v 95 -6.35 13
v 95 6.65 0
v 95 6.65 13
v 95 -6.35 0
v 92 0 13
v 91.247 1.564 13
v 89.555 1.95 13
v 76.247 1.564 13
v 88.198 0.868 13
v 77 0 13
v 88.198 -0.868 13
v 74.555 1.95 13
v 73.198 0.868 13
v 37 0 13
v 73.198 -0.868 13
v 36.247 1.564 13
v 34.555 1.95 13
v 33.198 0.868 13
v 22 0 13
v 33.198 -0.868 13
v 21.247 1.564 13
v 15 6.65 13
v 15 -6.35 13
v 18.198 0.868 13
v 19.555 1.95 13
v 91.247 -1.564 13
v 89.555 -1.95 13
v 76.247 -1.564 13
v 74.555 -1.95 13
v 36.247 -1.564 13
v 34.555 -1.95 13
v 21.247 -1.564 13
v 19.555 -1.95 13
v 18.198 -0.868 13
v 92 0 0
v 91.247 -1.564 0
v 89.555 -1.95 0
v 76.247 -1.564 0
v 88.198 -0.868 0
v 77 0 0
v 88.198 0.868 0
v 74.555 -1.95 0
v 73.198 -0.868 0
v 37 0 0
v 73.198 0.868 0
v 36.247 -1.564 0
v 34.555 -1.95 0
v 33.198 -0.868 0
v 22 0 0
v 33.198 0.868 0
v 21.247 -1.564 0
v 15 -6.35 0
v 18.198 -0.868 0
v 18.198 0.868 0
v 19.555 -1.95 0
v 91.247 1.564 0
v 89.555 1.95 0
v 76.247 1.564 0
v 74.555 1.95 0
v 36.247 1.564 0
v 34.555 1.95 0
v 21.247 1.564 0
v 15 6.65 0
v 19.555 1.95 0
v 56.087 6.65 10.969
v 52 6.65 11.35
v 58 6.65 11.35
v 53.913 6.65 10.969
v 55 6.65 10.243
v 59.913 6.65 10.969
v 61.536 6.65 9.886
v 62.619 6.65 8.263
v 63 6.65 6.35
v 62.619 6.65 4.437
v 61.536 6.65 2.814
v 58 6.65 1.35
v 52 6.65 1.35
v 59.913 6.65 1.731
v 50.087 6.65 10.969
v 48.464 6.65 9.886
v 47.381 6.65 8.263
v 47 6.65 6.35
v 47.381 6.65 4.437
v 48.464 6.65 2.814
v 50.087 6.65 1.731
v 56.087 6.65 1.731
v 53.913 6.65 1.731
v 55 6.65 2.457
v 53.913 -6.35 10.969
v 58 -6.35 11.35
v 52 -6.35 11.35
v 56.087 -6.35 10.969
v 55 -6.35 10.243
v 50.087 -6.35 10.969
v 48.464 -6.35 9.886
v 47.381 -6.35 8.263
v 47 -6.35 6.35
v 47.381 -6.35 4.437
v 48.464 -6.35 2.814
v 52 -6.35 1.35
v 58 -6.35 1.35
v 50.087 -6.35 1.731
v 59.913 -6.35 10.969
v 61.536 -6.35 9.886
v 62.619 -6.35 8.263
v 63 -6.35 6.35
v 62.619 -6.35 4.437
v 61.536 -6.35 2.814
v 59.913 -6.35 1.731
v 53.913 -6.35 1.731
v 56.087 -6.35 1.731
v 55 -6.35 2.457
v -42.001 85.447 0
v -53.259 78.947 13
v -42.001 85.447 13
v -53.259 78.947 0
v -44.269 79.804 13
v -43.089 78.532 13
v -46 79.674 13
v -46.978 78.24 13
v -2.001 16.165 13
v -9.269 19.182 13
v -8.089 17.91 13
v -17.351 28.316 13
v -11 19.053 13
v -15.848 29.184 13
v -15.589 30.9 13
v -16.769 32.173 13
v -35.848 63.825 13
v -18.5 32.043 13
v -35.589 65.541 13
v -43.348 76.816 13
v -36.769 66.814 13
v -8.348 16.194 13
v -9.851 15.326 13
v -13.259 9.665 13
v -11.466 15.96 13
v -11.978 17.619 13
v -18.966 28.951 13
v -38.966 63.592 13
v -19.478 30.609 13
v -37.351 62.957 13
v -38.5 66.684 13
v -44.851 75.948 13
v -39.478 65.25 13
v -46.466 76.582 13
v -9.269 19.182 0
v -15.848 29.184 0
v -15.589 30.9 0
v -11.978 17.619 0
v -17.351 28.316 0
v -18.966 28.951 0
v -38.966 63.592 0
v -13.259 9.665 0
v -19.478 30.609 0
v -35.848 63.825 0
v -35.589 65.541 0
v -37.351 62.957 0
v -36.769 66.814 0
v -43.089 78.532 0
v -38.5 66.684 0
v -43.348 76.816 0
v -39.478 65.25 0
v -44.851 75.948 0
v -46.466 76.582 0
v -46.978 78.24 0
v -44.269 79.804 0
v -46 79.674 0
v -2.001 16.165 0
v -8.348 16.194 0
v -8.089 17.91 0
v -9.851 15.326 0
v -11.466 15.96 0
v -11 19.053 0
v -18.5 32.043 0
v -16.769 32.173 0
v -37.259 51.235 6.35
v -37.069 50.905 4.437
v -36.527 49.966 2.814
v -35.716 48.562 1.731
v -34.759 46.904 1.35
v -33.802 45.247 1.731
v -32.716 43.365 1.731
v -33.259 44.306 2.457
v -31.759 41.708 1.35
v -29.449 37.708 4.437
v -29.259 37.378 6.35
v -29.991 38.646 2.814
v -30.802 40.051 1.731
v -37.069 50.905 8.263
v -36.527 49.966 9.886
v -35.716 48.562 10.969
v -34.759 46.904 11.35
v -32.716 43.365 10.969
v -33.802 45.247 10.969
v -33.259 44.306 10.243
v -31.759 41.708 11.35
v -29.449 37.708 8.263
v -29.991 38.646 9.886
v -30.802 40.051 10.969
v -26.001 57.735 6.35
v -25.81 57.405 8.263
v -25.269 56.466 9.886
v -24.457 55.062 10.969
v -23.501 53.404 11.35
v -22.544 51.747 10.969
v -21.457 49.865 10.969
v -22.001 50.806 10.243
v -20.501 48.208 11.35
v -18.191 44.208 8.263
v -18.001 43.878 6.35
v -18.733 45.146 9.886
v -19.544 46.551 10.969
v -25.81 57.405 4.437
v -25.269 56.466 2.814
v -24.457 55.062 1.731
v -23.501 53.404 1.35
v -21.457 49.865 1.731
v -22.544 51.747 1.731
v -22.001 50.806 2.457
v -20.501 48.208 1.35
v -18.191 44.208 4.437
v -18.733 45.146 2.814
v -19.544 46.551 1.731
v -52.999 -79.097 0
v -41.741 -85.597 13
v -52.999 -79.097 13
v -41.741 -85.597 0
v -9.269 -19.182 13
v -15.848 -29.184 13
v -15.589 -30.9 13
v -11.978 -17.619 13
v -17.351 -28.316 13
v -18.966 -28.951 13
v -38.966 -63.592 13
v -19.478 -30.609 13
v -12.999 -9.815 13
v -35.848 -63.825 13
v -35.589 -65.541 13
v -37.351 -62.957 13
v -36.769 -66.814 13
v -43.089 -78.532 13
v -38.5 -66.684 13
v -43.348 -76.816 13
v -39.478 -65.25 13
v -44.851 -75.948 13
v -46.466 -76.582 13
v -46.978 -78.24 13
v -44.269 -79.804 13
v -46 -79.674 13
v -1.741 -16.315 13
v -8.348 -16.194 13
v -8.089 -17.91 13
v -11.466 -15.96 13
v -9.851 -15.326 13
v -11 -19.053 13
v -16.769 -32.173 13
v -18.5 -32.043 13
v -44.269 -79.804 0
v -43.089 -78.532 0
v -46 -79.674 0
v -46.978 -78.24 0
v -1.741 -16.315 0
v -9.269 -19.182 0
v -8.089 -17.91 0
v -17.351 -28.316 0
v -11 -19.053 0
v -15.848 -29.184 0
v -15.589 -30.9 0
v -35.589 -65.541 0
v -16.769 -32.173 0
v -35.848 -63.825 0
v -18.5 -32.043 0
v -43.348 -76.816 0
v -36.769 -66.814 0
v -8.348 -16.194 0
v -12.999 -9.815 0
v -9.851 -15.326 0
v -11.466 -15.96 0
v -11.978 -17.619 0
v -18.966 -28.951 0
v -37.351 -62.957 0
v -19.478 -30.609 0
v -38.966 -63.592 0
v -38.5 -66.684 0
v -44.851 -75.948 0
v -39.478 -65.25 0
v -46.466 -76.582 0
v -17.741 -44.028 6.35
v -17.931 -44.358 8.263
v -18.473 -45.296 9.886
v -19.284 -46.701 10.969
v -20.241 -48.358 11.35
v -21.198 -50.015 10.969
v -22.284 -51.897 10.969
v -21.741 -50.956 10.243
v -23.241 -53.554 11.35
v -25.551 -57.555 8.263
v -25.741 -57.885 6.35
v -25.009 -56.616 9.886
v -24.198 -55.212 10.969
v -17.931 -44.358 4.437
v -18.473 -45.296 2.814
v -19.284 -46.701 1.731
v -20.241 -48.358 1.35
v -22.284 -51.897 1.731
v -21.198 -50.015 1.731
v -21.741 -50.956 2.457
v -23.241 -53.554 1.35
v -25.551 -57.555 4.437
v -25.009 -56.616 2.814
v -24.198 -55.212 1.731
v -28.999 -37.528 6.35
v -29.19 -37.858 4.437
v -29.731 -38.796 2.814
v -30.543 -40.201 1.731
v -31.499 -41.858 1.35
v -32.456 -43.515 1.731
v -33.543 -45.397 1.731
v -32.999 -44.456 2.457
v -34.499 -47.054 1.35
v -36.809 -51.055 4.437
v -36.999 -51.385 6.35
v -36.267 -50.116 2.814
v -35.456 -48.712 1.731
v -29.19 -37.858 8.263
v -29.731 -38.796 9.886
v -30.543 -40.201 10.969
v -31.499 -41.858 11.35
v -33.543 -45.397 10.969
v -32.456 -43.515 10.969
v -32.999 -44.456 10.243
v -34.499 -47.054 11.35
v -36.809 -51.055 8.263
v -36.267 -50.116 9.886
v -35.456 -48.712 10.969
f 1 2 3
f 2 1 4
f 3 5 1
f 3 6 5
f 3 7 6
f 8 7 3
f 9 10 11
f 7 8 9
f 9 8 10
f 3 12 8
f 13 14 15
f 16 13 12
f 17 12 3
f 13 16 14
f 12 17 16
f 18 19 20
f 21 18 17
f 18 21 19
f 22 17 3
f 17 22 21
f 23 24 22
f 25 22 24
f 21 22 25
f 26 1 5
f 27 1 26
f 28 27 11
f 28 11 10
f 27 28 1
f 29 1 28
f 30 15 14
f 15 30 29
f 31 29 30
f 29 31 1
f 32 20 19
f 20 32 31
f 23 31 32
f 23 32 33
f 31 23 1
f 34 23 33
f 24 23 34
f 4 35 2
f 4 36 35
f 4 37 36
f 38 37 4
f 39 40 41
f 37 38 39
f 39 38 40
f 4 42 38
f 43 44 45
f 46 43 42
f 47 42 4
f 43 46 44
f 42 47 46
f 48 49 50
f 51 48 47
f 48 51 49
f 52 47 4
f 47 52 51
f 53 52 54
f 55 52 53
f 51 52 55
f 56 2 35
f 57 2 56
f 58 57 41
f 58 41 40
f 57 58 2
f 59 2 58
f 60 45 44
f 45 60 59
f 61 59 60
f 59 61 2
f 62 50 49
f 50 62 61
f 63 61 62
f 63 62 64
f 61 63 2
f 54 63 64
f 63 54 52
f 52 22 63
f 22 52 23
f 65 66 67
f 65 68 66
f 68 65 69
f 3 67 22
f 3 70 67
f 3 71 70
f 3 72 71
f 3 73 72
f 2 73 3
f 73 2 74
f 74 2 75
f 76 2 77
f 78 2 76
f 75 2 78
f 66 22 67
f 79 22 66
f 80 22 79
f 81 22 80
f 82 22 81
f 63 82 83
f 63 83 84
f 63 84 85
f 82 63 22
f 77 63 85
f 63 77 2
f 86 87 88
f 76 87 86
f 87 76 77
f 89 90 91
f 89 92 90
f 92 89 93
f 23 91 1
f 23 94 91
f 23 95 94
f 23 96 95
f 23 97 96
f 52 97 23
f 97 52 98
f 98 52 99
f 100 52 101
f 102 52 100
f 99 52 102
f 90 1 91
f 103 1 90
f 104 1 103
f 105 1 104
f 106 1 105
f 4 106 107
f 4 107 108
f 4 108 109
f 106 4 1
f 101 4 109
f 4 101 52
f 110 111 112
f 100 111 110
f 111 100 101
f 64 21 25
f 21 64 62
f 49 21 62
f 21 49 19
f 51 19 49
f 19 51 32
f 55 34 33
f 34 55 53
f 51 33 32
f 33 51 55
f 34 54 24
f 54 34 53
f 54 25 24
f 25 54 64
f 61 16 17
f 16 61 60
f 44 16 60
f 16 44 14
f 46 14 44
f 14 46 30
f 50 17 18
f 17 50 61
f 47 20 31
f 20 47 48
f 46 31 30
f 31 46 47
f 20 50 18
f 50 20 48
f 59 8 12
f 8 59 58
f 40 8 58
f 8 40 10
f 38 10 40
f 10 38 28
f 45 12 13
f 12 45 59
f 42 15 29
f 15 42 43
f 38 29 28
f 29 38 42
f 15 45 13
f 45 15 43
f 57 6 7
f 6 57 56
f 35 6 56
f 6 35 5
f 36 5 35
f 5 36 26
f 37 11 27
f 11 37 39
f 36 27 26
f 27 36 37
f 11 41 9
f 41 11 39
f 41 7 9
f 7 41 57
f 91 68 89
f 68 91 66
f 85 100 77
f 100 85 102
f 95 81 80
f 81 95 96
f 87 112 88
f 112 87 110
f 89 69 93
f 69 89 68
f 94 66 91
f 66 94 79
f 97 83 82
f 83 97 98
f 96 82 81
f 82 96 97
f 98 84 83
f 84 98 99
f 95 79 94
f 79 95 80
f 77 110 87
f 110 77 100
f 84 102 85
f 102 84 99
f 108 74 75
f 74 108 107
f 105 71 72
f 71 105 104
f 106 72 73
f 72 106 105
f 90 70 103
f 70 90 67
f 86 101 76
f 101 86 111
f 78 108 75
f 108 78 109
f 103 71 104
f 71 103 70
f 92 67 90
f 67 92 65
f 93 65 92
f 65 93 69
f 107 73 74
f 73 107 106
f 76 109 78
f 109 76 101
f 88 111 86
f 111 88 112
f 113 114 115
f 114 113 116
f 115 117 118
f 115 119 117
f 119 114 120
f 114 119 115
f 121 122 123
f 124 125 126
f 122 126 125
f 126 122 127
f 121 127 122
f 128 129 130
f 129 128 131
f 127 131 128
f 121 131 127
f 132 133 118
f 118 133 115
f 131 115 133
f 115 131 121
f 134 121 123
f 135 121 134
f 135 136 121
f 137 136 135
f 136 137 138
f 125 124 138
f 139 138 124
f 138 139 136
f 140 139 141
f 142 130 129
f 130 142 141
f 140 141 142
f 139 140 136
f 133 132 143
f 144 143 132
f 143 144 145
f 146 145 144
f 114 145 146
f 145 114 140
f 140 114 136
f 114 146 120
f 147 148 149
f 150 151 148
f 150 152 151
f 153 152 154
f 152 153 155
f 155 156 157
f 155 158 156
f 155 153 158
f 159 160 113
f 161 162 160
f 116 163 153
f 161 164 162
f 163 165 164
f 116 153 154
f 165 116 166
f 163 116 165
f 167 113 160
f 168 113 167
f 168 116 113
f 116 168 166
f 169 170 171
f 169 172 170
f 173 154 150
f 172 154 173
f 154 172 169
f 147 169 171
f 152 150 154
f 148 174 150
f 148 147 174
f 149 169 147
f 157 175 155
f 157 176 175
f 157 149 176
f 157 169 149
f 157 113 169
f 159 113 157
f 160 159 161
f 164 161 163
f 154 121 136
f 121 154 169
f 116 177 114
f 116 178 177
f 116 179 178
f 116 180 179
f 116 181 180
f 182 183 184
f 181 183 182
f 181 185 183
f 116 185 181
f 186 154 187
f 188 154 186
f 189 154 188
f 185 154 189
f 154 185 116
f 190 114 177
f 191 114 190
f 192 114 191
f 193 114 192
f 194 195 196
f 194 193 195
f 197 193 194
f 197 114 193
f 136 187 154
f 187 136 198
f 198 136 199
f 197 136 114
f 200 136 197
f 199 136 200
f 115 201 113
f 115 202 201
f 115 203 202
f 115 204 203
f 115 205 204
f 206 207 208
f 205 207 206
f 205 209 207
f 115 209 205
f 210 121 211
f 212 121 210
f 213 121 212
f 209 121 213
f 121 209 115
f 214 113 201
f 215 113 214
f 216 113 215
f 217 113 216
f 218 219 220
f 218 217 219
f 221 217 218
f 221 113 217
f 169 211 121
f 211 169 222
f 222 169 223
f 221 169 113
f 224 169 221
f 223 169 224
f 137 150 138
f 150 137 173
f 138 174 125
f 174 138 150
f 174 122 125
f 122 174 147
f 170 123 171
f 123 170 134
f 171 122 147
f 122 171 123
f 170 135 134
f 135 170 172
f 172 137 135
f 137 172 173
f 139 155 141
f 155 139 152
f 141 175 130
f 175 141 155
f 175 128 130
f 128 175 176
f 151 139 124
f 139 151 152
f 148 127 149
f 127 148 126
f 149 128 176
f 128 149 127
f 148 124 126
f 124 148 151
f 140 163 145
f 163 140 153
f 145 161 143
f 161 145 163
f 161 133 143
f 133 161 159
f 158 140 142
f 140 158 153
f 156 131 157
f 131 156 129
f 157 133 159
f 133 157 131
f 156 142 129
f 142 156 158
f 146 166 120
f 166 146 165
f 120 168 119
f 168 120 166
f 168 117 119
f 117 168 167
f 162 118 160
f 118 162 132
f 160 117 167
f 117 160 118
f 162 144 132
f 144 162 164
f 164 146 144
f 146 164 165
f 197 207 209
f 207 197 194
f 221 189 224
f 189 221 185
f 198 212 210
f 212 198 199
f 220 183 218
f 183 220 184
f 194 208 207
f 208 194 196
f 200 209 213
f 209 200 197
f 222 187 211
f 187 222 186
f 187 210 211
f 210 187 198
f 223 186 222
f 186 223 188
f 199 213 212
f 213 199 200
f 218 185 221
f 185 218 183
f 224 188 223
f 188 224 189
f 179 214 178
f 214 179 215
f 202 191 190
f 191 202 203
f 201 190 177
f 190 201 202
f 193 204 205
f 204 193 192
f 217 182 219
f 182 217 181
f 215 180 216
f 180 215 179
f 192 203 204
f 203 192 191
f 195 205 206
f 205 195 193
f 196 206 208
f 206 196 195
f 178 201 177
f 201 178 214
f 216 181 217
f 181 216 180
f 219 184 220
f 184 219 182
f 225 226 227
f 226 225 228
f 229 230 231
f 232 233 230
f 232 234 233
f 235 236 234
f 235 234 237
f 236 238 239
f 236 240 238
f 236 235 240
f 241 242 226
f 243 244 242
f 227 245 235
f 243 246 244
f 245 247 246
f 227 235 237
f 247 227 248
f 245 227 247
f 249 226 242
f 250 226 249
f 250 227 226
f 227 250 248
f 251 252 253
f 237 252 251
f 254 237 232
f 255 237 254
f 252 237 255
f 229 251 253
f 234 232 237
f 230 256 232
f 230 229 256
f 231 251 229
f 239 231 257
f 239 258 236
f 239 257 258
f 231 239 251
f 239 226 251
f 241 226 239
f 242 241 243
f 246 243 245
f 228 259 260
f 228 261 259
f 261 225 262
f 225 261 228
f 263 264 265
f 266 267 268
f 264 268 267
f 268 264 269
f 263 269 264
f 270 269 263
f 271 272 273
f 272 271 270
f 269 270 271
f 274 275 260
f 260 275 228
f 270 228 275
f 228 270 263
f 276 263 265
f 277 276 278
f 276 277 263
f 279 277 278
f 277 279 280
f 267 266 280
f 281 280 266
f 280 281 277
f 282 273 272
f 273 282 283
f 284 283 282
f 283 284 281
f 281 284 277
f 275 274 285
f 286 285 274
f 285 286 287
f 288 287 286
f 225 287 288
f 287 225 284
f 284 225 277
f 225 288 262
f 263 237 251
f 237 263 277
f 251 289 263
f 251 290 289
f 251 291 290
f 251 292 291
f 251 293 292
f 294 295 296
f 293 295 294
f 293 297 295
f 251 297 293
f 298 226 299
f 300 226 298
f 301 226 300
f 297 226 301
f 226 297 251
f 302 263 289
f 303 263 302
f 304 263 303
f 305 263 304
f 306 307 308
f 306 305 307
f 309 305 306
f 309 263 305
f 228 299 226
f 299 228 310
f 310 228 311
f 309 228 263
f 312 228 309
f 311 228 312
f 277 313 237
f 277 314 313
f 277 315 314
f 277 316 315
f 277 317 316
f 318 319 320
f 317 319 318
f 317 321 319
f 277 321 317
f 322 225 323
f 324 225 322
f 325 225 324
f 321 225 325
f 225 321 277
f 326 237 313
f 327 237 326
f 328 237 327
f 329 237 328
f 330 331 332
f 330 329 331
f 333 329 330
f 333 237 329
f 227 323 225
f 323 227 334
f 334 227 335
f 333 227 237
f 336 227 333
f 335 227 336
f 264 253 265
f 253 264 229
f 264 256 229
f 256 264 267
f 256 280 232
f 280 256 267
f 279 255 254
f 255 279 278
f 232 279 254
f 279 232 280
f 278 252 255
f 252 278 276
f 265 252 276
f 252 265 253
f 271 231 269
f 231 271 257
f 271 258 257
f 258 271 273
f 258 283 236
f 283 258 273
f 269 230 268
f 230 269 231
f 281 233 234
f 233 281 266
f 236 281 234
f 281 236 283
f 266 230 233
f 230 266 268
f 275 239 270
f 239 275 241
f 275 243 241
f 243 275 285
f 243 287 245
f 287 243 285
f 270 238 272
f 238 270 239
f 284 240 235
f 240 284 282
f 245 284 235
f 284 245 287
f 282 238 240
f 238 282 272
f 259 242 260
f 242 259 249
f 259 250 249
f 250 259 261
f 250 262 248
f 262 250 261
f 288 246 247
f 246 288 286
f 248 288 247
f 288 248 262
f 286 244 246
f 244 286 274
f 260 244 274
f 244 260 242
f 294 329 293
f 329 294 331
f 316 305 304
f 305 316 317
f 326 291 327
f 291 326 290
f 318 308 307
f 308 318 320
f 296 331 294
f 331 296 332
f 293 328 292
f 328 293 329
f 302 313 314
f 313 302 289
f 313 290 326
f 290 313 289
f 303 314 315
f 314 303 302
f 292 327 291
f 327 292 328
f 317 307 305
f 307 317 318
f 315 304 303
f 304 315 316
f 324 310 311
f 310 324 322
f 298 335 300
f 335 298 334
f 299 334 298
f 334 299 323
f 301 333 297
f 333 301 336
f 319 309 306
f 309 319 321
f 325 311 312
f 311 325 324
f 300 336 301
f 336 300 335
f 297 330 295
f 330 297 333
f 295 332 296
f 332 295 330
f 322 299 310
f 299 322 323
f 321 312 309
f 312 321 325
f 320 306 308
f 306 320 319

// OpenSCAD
r=100;

//top();
for (i=[0:120:240]) rotate(i) translate([r-80-5,-12.7/2,0]) hx711();


difference() {
  union() {
    bottom();
    for (i=[30:30:90]) rotate(i) translate([50,-10.5]) board();
    rotate(300) translate([50,-27.7/2]) 240ips();
    translate([-75,-50]) battery();
  }
  for (i=[30:30:90]) rotate(i) translate([50,-10.5]) board_holes();
  rotate(300) translate([50,-27.7/2]) 240ips_holes();
  translate([-75,-50]) battery_holes();
  }
  
  


module hx711() {
  difference() {
    color("silver") cube([80,13,13]);
    translate([5,12.7/2,-1]) cylinder(13+2, 2,2);
    translate([20,12.7/2,-1]) cylinder(13+2, 2,2);
    translate([60,12.7/2,-1]) cylinder(13+2, 2,2);
    translate([75,12.7/2,-1]) cylinder(13+2, 2,2);
    translate([37,12.7+1,12.7/2]) rotate([90,0,0]) cylinder(13+2,5,5);
    translate([43,12.7+1,12.7/2]) rotate([90,0,0]) cylinder(13+2,5,5);
  }
}

module board() {
    color("green") square([34,21]);
}

module board_holes() {
  translate([4,3]) circle(1.5);
  translate([4,18]) circle(1.5);
}

module 240ips() {
  color("blue") square([39.2,27.7]);
}
module 240ips_holes() {
  translate([2.5,2.5]) circle(1);
  translate([2.5,27.7-2.5]) circle(1);
  translate([39.2-2.5,27.7-2.5]) circle(1);
  translate([39.2-2.5,2.5]) circle(1);
}


module battery() {
  color("darkgrey") square([30,100]);
}

module battery_holes() {
  translate([2,2]) circle(1.5);
  translate([28,2]) circle(1.5);
  translate([2,98]) circle(1.5);
  translate([28,98]) circle(1.5);
}


module top() {
  difference() {
    circle(r);
    for (i=[0:120:240]) rotate(i) translate([r-10,0,0]) circle(3);
  }
}


module bottom() {
  difference() {
    circle(r);
    circle(2.5);
    for (i=[0:120:240]) rotate(i) translate([r-80,0,0]) circle(2.5);
    for (i=[0:120:240]) rotate(i) translate([r-65,0,0]) circle(2.5);
    for (i=[0:120:240]) rotate(i) translate([r-10,0,0]) circle(2.5);
  }
}
